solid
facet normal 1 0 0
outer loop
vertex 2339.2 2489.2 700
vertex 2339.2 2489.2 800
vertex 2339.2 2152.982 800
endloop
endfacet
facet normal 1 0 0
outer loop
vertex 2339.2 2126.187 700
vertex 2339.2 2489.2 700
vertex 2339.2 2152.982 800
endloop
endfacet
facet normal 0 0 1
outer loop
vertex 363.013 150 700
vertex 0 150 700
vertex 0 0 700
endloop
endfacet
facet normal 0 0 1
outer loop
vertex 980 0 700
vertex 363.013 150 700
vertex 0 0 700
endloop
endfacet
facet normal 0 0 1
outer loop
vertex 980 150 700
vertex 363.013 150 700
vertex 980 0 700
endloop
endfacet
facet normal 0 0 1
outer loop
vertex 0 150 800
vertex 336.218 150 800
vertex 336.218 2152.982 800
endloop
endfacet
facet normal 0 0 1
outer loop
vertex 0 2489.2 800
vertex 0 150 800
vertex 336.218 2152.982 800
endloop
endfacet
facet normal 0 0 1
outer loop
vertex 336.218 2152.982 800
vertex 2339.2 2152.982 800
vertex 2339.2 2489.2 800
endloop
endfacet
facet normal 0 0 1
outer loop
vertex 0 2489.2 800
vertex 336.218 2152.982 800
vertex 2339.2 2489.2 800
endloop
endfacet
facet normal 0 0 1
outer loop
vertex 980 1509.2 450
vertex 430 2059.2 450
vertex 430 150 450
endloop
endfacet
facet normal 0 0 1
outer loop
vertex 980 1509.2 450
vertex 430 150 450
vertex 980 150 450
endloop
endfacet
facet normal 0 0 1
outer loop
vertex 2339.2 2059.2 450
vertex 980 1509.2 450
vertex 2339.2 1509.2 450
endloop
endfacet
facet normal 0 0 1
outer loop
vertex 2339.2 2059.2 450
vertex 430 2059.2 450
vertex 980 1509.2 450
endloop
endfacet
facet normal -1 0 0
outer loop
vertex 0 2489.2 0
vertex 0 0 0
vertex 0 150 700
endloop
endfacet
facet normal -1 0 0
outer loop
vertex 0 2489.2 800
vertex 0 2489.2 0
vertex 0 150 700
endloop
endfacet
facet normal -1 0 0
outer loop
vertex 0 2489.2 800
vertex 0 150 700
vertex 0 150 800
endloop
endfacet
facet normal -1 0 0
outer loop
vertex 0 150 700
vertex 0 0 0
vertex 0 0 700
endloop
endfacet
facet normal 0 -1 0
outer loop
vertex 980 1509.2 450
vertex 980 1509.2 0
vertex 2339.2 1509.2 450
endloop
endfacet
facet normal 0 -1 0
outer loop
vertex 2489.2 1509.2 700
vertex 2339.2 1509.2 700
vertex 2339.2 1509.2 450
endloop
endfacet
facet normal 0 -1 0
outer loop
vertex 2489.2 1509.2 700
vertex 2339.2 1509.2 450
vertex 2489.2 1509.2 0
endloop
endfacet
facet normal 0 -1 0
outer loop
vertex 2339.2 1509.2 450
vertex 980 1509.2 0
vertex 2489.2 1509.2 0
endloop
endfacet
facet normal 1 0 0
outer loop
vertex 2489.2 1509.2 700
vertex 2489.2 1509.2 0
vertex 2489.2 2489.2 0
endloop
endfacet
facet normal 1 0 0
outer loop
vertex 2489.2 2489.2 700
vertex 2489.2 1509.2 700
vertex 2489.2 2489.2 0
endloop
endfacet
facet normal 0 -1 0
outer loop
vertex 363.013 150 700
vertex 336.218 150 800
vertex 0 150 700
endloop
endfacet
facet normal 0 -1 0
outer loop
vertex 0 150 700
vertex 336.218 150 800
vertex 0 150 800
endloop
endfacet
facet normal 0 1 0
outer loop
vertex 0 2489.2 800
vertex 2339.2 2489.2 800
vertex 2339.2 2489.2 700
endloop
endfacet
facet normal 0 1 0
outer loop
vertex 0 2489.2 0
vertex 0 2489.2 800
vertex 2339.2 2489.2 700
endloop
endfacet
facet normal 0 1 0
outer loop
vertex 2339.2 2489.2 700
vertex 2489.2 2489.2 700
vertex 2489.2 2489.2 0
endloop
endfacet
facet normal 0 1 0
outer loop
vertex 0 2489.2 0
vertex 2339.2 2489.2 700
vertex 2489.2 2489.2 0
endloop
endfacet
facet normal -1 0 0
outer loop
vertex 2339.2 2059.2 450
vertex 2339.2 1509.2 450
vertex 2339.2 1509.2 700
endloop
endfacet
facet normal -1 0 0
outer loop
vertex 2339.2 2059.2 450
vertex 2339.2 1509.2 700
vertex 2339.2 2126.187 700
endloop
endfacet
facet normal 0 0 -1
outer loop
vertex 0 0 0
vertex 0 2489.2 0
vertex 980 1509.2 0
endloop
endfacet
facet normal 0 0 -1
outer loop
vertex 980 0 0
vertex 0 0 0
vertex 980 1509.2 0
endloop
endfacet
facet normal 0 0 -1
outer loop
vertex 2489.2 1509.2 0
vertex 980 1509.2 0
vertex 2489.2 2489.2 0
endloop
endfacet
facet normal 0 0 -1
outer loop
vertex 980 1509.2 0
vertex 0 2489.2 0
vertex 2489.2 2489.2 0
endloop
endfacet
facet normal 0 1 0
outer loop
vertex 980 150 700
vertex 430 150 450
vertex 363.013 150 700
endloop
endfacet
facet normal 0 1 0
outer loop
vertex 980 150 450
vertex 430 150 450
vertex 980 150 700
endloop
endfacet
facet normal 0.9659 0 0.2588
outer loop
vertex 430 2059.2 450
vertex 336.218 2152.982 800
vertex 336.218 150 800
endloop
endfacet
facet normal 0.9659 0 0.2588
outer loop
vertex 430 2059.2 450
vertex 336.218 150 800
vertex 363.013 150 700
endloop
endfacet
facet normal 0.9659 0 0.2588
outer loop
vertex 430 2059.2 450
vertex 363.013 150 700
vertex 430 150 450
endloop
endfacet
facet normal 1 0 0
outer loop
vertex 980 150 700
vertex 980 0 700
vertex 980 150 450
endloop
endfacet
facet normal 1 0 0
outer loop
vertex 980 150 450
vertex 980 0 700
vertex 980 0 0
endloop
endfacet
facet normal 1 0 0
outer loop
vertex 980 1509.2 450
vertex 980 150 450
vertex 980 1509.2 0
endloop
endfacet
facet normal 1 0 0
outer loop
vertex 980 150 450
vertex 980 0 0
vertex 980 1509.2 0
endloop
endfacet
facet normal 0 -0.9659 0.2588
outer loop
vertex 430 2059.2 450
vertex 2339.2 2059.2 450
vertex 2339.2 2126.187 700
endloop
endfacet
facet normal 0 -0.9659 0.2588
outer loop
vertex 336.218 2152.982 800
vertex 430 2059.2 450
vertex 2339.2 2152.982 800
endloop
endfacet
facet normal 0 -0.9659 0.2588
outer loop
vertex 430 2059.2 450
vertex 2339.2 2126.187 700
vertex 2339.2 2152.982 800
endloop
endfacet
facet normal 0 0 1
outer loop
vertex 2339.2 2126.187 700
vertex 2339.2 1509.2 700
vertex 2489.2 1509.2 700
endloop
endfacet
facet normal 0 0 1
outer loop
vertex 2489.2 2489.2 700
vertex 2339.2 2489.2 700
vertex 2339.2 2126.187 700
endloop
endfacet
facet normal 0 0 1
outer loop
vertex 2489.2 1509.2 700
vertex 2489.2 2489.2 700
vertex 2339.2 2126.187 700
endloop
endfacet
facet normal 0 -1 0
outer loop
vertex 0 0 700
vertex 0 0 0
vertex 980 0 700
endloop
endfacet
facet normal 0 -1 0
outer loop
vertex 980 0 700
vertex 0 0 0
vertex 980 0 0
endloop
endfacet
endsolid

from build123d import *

# Parameters (mm, degrees)
F1_DEPTH = 450
F2_W     = 980
F2_H     = 150
F2_W_2   = 150
F2_H_2   = 980
F3_DEPTH = 250
F5_DEPTH = 2339.2


with BuildPart() as f1:
    # F0 (on Top) → F1 (new body)
    with BuildSketch(Plane.XY):
        Polygon((0, 2489.2), (0, 0), (980, 0), (980, 1509.2), (2489.2, 1509.2), (2489.2, 2489.2), align=None)
    extrude(amount=F1_DEPTH)

    # F2 (on face) → F3 (join)
    with BuildSketch(Plane.XY.offset(450)):
        with Locations((490, 75)):
            Rectangle(F2_W, F2_H)
        with Locations((2414.2, 1999.2)):
            Rectangle(F2_W_2, F2_H_2)
    extrude(amount=F3_DEPTH)

    # F4 (on face) → F5 (join, through all)
    with BuildSketch(Plane(origin=(0, 150, 0), x_dir=(-1, 0, 0), z_dir=(0, 1, 0))):
        Polygon((-430, 450), (0, 450), (0, 800), (-336.2177826491, 800), align=None)
    extrude(amount=F5_DEPTH)

    # F6 (on face) → F7 (join, up to the next surface of F1)
    with BuildSketch(Plane(origin=(2339.2, 0, 0), x_dir=(0, -1, 0), z_dir=(-1, 0, 0))):
        Polygon((-2489.2, 800), (-2489.2, 450), (-2059.2, 450), (-2152.9822173509, 800), align=None)
    extrude(until=Until.NEXT)


solid = f1.part
